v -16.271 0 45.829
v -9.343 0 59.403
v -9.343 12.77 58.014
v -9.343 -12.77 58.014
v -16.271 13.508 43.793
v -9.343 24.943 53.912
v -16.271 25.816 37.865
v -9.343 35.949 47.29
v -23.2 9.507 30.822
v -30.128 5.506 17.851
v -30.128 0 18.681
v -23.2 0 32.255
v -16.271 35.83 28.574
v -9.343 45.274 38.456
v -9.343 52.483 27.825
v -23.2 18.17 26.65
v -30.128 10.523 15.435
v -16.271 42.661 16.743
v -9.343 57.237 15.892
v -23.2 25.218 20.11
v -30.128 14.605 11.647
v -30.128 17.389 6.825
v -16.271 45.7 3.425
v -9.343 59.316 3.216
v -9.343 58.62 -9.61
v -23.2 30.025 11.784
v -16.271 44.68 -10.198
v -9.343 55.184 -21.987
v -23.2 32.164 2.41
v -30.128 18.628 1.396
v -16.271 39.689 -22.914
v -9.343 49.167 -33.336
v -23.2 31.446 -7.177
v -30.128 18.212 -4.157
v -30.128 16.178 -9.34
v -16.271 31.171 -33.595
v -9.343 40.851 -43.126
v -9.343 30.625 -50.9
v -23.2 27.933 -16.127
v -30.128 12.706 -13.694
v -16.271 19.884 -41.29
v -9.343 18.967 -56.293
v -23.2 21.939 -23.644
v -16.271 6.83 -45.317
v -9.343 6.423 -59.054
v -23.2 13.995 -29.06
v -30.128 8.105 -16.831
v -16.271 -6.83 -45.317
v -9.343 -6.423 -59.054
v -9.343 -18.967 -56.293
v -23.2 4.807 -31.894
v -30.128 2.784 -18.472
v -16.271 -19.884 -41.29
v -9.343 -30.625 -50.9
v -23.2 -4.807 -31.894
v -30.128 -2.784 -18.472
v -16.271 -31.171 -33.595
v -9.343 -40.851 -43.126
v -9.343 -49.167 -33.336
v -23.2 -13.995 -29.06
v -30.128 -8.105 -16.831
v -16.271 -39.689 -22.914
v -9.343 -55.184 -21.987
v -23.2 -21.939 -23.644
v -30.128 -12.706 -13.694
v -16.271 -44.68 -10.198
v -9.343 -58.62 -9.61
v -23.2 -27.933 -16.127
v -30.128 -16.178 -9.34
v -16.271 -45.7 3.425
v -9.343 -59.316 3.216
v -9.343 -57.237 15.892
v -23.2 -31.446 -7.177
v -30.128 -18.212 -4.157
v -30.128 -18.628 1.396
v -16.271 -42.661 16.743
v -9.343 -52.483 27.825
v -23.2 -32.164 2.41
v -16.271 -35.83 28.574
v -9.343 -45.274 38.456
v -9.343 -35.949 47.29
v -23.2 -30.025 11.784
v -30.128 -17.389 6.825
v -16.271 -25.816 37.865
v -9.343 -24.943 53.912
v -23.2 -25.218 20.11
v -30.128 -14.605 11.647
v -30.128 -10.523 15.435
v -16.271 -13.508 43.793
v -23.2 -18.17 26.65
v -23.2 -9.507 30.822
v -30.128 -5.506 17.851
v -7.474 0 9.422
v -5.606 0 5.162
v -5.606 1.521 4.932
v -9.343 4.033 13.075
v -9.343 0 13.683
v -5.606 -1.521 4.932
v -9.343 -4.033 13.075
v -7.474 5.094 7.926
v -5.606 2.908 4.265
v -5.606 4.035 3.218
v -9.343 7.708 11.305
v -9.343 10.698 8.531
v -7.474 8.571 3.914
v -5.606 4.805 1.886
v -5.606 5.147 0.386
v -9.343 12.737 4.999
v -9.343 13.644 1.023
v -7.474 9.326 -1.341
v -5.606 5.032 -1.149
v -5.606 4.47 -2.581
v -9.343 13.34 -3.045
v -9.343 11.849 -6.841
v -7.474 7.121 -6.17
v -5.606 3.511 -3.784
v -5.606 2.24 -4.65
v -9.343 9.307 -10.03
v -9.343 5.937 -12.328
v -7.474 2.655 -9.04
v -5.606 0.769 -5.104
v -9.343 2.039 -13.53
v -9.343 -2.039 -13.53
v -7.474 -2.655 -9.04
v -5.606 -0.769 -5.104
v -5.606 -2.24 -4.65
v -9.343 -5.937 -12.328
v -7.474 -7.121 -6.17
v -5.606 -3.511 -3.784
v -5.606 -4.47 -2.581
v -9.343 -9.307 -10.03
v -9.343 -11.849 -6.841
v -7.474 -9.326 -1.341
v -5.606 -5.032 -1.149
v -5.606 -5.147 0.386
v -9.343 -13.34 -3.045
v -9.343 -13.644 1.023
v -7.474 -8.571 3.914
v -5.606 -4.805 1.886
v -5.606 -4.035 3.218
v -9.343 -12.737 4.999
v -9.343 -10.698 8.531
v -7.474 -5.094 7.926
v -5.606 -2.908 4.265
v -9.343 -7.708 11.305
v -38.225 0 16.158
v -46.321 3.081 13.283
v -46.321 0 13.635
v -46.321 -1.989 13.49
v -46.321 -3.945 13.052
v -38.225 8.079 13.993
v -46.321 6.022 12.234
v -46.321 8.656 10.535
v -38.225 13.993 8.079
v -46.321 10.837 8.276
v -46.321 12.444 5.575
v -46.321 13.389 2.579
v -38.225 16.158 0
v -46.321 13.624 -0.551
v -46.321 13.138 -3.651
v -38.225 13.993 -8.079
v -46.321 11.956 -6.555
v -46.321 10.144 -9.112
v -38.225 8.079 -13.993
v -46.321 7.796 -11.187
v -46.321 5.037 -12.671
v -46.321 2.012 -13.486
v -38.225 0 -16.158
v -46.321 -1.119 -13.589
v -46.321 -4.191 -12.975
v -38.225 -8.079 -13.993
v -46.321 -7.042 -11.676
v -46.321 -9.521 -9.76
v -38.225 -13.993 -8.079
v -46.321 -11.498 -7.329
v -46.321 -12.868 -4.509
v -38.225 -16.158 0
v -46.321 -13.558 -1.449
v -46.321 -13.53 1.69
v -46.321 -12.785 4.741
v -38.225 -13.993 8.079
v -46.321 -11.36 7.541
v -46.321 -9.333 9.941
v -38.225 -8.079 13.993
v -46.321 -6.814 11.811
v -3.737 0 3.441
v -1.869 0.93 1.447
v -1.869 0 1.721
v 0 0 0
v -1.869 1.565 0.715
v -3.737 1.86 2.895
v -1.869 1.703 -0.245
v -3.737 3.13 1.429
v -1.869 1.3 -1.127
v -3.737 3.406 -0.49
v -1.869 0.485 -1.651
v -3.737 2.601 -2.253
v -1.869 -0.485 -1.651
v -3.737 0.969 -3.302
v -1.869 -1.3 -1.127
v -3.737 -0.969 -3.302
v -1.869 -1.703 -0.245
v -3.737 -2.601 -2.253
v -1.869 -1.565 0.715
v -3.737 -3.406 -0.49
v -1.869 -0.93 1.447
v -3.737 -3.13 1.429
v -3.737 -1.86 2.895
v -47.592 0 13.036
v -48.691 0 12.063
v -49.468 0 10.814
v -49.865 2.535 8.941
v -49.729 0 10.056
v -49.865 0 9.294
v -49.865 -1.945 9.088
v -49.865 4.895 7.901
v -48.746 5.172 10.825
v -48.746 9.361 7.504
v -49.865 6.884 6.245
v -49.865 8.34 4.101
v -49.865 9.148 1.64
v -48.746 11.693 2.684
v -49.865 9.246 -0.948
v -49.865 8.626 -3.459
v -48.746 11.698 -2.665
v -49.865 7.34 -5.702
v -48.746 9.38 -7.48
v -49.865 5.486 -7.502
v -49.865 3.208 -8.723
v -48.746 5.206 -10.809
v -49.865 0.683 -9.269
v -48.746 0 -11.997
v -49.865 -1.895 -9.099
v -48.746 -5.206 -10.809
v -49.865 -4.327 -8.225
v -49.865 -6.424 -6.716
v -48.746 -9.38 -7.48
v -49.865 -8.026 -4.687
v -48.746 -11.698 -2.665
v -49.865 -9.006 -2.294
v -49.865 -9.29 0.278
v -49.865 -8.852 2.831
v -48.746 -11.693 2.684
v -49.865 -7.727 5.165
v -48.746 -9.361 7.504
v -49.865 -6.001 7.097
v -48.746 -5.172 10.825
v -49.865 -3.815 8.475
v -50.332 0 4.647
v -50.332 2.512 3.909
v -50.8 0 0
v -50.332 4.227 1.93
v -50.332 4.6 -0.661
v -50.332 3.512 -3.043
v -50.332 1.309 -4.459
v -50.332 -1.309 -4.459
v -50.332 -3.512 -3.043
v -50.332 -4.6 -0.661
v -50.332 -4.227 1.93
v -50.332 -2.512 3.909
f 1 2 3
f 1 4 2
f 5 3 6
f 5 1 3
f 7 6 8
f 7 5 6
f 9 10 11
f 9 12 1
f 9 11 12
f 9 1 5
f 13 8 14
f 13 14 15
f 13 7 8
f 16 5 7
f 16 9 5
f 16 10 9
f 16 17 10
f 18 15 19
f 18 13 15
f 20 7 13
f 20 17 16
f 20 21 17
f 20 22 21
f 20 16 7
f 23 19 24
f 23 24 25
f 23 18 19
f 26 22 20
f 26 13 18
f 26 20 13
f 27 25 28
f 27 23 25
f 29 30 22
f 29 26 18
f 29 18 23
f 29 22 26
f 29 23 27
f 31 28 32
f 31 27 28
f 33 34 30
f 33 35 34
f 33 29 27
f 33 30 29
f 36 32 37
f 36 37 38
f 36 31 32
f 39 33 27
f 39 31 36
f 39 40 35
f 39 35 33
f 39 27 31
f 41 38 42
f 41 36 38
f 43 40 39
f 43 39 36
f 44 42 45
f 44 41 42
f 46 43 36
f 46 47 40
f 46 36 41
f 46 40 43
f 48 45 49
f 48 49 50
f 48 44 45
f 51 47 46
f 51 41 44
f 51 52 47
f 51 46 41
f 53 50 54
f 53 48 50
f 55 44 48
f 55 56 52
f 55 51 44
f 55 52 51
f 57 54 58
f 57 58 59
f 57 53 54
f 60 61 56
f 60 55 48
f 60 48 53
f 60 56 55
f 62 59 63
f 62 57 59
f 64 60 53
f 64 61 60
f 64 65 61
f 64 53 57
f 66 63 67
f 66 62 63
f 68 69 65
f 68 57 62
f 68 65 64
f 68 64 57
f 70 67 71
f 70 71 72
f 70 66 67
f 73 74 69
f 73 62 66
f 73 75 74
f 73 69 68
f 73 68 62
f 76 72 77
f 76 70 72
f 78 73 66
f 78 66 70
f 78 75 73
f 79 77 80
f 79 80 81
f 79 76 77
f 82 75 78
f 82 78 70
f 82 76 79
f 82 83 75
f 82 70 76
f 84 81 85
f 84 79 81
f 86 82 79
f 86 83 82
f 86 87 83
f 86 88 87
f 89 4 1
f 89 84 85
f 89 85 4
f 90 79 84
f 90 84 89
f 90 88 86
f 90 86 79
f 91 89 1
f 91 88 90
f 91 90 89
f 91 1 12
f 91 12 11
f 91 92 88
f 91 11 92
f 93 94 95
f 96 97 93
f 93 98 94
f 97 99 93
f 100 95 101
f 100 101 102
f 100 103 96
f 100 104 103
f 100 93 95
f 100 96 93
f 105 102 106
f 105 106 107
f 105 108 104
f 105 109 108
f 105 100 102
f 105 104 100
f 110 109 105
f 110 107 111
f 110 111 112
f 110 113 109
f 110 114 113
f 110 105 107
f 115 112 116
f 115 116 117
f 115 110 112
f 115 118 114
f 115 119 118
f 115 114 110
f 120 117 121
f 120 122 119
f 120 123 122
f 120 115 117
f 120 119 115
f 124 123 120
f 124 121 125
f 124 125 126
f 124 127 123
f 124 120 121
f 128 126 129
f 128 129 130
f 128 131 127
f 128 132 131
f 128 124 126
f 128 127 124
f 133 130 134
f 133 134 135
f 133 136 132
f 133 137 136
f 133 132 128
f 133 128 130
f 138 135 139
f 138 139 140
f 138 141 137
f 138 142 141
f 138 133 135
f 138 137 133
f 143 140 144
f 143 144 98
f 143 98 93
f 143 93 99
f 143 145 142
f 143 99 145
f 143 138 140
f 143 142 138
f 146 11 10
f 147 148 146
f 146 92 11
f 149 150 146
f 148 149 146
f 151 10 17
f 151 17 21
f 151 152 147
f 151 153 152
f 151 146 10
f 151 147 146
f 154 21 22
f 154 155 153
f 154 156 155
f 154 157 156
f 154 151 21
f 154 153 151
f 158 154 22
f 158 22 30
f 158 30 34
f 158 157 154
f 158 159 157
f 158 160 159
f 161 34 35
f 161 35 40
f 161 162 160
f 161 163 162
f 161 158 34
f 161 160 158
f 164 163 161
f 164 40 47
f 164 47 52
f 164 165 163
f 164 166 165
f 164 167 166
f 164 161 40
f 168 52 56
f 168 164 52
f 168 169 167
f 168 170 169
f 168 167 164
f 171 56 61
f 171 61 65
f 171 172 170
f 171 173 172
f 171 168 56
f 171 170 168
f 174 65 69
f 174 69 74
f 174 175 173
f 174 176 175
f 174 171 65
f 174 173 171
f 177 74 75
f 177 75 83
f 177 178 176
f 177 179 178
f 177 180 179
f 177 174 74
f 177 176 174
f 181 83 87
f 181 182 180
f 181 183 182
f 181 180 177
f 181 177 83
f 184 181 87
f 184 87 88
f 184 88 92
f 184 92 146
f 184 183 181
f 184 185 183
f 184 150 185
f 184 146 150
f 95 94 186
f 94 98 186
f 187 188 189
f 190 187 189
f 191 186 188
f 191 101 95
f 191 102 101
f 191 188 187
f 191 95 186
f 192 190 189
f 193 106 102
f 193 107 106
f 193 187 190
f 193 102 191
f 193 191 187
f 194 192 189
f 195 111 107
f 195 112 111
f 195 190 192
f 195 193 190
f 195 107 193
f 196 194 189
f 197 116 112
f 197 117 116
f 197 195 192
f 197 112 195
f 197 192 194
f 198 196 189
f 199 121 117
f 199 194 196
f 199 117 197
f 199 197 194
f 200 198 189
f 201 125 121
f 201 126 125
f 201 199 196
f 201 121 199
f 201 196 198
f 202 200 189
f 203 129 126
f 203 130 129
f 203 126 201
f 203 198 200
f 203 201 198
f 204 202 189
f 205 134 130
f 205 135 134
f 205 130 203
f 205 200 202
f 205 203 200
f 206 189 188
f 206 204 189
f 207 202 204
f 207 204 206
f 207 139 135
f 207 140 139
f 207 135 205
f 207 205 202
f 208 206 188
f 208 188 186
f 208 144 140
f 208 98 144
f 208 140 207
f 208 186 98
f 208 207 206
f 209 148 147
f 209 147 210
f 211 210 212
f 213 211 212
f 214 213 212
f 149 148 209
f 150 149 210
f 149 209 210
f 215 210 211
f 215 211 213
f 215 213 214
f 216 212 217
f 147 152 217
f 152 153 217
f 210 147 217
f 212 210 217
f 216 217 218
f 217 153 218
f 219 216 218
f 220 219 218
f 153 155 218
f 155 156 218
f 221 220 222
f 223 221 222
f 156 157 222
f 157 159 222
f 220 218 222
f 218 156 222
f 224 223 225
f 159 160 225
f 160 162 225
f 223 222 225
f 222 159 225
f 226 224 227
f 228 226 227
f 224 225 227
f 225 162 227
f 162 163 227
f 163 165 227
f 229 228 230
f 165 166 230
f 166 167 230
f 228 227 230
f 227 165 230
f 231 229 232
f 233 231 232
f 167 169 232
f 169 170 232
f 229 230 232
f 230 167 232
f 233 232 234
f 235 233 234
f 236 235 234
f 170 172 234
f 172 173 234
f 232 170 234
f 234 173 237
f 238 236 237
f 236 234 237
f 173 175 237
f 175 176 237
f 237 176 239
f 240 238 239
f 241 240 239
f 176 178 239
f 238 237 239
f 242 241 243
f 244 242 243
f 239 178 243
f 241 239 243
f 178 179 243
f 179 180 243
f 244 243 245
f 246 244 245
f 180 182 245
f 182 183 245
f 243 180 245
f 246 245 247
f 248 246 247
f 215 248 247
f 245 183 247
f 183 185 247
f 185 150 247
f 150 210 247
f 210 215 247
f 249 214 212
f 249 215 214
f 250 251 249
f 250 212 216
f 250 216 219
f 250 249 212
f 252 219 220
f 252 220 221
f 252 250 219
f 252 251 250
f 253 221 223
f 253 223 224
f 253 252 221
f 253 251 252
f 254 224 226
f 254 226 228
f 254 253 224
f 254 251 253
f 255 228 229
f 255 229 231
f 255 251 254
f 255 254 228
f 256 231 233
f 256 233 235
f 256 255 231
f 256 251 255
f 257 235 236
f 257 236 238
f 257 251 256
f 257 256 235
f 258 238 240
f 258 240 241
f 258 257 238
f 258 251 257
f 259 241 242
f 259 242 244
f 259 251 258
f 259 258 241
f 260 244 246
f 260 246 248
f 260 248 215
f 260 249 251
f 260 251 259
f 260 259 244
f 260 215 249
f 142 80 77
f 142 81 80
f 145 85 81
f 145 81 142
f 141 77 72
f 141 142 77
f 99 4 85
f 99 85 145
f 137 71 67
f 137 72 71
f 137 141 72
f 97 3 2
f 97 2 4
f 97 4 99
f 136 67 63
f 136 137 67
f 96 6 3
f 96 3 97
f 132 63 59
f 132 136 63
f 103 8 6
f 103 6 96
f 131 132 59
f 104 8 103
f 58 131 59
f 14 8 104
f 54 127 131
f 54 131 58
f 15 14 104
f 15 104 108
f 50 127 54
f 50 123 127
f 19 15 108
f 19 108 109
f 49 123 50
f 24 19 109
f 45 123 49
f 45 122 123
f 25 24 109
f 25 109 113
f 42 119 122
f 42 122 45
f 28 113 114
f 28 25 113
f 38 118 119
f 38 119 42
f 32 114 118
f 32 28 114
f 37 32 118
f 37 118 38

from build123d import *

# Parameters (mm, degrees)
F2_SIZE = 5.08
F3_R    = 5.08


with BuildPart() as f1:
    # F0 (on Front) → F1 (revolve)
    with BuildSketch(Plane.XZ):
        Polygon((-30.128215, 18.680663), (-49.528385, 12.636178), (-50.8, 0), (0, 0), (-9.342636, 8.602624), (-9.342636, 59.402624), align=None)
    revolve(axis=Axis((-25.4, 0, 0), (-1, 0, 0)))

    # F2
    f2_edges = [f1.edges().sort_by_distance(p)[0] for p in [
        (-9.342636, 0, -8.602624),
        (-4.671318, 0, 4.301312),
    ]]
    chamfer(f2_edges, length=F2_SIZE)

    # F3
    f3_edges = [f1.edges().sort_by_distance(p)[0] for p in [
        (-49.528385, 0, -12.636178),
        (-50.164193, 0, 6.318089),
    ]]
    fillet(f3_edges, radius=F3_R)


solid = f1.part
